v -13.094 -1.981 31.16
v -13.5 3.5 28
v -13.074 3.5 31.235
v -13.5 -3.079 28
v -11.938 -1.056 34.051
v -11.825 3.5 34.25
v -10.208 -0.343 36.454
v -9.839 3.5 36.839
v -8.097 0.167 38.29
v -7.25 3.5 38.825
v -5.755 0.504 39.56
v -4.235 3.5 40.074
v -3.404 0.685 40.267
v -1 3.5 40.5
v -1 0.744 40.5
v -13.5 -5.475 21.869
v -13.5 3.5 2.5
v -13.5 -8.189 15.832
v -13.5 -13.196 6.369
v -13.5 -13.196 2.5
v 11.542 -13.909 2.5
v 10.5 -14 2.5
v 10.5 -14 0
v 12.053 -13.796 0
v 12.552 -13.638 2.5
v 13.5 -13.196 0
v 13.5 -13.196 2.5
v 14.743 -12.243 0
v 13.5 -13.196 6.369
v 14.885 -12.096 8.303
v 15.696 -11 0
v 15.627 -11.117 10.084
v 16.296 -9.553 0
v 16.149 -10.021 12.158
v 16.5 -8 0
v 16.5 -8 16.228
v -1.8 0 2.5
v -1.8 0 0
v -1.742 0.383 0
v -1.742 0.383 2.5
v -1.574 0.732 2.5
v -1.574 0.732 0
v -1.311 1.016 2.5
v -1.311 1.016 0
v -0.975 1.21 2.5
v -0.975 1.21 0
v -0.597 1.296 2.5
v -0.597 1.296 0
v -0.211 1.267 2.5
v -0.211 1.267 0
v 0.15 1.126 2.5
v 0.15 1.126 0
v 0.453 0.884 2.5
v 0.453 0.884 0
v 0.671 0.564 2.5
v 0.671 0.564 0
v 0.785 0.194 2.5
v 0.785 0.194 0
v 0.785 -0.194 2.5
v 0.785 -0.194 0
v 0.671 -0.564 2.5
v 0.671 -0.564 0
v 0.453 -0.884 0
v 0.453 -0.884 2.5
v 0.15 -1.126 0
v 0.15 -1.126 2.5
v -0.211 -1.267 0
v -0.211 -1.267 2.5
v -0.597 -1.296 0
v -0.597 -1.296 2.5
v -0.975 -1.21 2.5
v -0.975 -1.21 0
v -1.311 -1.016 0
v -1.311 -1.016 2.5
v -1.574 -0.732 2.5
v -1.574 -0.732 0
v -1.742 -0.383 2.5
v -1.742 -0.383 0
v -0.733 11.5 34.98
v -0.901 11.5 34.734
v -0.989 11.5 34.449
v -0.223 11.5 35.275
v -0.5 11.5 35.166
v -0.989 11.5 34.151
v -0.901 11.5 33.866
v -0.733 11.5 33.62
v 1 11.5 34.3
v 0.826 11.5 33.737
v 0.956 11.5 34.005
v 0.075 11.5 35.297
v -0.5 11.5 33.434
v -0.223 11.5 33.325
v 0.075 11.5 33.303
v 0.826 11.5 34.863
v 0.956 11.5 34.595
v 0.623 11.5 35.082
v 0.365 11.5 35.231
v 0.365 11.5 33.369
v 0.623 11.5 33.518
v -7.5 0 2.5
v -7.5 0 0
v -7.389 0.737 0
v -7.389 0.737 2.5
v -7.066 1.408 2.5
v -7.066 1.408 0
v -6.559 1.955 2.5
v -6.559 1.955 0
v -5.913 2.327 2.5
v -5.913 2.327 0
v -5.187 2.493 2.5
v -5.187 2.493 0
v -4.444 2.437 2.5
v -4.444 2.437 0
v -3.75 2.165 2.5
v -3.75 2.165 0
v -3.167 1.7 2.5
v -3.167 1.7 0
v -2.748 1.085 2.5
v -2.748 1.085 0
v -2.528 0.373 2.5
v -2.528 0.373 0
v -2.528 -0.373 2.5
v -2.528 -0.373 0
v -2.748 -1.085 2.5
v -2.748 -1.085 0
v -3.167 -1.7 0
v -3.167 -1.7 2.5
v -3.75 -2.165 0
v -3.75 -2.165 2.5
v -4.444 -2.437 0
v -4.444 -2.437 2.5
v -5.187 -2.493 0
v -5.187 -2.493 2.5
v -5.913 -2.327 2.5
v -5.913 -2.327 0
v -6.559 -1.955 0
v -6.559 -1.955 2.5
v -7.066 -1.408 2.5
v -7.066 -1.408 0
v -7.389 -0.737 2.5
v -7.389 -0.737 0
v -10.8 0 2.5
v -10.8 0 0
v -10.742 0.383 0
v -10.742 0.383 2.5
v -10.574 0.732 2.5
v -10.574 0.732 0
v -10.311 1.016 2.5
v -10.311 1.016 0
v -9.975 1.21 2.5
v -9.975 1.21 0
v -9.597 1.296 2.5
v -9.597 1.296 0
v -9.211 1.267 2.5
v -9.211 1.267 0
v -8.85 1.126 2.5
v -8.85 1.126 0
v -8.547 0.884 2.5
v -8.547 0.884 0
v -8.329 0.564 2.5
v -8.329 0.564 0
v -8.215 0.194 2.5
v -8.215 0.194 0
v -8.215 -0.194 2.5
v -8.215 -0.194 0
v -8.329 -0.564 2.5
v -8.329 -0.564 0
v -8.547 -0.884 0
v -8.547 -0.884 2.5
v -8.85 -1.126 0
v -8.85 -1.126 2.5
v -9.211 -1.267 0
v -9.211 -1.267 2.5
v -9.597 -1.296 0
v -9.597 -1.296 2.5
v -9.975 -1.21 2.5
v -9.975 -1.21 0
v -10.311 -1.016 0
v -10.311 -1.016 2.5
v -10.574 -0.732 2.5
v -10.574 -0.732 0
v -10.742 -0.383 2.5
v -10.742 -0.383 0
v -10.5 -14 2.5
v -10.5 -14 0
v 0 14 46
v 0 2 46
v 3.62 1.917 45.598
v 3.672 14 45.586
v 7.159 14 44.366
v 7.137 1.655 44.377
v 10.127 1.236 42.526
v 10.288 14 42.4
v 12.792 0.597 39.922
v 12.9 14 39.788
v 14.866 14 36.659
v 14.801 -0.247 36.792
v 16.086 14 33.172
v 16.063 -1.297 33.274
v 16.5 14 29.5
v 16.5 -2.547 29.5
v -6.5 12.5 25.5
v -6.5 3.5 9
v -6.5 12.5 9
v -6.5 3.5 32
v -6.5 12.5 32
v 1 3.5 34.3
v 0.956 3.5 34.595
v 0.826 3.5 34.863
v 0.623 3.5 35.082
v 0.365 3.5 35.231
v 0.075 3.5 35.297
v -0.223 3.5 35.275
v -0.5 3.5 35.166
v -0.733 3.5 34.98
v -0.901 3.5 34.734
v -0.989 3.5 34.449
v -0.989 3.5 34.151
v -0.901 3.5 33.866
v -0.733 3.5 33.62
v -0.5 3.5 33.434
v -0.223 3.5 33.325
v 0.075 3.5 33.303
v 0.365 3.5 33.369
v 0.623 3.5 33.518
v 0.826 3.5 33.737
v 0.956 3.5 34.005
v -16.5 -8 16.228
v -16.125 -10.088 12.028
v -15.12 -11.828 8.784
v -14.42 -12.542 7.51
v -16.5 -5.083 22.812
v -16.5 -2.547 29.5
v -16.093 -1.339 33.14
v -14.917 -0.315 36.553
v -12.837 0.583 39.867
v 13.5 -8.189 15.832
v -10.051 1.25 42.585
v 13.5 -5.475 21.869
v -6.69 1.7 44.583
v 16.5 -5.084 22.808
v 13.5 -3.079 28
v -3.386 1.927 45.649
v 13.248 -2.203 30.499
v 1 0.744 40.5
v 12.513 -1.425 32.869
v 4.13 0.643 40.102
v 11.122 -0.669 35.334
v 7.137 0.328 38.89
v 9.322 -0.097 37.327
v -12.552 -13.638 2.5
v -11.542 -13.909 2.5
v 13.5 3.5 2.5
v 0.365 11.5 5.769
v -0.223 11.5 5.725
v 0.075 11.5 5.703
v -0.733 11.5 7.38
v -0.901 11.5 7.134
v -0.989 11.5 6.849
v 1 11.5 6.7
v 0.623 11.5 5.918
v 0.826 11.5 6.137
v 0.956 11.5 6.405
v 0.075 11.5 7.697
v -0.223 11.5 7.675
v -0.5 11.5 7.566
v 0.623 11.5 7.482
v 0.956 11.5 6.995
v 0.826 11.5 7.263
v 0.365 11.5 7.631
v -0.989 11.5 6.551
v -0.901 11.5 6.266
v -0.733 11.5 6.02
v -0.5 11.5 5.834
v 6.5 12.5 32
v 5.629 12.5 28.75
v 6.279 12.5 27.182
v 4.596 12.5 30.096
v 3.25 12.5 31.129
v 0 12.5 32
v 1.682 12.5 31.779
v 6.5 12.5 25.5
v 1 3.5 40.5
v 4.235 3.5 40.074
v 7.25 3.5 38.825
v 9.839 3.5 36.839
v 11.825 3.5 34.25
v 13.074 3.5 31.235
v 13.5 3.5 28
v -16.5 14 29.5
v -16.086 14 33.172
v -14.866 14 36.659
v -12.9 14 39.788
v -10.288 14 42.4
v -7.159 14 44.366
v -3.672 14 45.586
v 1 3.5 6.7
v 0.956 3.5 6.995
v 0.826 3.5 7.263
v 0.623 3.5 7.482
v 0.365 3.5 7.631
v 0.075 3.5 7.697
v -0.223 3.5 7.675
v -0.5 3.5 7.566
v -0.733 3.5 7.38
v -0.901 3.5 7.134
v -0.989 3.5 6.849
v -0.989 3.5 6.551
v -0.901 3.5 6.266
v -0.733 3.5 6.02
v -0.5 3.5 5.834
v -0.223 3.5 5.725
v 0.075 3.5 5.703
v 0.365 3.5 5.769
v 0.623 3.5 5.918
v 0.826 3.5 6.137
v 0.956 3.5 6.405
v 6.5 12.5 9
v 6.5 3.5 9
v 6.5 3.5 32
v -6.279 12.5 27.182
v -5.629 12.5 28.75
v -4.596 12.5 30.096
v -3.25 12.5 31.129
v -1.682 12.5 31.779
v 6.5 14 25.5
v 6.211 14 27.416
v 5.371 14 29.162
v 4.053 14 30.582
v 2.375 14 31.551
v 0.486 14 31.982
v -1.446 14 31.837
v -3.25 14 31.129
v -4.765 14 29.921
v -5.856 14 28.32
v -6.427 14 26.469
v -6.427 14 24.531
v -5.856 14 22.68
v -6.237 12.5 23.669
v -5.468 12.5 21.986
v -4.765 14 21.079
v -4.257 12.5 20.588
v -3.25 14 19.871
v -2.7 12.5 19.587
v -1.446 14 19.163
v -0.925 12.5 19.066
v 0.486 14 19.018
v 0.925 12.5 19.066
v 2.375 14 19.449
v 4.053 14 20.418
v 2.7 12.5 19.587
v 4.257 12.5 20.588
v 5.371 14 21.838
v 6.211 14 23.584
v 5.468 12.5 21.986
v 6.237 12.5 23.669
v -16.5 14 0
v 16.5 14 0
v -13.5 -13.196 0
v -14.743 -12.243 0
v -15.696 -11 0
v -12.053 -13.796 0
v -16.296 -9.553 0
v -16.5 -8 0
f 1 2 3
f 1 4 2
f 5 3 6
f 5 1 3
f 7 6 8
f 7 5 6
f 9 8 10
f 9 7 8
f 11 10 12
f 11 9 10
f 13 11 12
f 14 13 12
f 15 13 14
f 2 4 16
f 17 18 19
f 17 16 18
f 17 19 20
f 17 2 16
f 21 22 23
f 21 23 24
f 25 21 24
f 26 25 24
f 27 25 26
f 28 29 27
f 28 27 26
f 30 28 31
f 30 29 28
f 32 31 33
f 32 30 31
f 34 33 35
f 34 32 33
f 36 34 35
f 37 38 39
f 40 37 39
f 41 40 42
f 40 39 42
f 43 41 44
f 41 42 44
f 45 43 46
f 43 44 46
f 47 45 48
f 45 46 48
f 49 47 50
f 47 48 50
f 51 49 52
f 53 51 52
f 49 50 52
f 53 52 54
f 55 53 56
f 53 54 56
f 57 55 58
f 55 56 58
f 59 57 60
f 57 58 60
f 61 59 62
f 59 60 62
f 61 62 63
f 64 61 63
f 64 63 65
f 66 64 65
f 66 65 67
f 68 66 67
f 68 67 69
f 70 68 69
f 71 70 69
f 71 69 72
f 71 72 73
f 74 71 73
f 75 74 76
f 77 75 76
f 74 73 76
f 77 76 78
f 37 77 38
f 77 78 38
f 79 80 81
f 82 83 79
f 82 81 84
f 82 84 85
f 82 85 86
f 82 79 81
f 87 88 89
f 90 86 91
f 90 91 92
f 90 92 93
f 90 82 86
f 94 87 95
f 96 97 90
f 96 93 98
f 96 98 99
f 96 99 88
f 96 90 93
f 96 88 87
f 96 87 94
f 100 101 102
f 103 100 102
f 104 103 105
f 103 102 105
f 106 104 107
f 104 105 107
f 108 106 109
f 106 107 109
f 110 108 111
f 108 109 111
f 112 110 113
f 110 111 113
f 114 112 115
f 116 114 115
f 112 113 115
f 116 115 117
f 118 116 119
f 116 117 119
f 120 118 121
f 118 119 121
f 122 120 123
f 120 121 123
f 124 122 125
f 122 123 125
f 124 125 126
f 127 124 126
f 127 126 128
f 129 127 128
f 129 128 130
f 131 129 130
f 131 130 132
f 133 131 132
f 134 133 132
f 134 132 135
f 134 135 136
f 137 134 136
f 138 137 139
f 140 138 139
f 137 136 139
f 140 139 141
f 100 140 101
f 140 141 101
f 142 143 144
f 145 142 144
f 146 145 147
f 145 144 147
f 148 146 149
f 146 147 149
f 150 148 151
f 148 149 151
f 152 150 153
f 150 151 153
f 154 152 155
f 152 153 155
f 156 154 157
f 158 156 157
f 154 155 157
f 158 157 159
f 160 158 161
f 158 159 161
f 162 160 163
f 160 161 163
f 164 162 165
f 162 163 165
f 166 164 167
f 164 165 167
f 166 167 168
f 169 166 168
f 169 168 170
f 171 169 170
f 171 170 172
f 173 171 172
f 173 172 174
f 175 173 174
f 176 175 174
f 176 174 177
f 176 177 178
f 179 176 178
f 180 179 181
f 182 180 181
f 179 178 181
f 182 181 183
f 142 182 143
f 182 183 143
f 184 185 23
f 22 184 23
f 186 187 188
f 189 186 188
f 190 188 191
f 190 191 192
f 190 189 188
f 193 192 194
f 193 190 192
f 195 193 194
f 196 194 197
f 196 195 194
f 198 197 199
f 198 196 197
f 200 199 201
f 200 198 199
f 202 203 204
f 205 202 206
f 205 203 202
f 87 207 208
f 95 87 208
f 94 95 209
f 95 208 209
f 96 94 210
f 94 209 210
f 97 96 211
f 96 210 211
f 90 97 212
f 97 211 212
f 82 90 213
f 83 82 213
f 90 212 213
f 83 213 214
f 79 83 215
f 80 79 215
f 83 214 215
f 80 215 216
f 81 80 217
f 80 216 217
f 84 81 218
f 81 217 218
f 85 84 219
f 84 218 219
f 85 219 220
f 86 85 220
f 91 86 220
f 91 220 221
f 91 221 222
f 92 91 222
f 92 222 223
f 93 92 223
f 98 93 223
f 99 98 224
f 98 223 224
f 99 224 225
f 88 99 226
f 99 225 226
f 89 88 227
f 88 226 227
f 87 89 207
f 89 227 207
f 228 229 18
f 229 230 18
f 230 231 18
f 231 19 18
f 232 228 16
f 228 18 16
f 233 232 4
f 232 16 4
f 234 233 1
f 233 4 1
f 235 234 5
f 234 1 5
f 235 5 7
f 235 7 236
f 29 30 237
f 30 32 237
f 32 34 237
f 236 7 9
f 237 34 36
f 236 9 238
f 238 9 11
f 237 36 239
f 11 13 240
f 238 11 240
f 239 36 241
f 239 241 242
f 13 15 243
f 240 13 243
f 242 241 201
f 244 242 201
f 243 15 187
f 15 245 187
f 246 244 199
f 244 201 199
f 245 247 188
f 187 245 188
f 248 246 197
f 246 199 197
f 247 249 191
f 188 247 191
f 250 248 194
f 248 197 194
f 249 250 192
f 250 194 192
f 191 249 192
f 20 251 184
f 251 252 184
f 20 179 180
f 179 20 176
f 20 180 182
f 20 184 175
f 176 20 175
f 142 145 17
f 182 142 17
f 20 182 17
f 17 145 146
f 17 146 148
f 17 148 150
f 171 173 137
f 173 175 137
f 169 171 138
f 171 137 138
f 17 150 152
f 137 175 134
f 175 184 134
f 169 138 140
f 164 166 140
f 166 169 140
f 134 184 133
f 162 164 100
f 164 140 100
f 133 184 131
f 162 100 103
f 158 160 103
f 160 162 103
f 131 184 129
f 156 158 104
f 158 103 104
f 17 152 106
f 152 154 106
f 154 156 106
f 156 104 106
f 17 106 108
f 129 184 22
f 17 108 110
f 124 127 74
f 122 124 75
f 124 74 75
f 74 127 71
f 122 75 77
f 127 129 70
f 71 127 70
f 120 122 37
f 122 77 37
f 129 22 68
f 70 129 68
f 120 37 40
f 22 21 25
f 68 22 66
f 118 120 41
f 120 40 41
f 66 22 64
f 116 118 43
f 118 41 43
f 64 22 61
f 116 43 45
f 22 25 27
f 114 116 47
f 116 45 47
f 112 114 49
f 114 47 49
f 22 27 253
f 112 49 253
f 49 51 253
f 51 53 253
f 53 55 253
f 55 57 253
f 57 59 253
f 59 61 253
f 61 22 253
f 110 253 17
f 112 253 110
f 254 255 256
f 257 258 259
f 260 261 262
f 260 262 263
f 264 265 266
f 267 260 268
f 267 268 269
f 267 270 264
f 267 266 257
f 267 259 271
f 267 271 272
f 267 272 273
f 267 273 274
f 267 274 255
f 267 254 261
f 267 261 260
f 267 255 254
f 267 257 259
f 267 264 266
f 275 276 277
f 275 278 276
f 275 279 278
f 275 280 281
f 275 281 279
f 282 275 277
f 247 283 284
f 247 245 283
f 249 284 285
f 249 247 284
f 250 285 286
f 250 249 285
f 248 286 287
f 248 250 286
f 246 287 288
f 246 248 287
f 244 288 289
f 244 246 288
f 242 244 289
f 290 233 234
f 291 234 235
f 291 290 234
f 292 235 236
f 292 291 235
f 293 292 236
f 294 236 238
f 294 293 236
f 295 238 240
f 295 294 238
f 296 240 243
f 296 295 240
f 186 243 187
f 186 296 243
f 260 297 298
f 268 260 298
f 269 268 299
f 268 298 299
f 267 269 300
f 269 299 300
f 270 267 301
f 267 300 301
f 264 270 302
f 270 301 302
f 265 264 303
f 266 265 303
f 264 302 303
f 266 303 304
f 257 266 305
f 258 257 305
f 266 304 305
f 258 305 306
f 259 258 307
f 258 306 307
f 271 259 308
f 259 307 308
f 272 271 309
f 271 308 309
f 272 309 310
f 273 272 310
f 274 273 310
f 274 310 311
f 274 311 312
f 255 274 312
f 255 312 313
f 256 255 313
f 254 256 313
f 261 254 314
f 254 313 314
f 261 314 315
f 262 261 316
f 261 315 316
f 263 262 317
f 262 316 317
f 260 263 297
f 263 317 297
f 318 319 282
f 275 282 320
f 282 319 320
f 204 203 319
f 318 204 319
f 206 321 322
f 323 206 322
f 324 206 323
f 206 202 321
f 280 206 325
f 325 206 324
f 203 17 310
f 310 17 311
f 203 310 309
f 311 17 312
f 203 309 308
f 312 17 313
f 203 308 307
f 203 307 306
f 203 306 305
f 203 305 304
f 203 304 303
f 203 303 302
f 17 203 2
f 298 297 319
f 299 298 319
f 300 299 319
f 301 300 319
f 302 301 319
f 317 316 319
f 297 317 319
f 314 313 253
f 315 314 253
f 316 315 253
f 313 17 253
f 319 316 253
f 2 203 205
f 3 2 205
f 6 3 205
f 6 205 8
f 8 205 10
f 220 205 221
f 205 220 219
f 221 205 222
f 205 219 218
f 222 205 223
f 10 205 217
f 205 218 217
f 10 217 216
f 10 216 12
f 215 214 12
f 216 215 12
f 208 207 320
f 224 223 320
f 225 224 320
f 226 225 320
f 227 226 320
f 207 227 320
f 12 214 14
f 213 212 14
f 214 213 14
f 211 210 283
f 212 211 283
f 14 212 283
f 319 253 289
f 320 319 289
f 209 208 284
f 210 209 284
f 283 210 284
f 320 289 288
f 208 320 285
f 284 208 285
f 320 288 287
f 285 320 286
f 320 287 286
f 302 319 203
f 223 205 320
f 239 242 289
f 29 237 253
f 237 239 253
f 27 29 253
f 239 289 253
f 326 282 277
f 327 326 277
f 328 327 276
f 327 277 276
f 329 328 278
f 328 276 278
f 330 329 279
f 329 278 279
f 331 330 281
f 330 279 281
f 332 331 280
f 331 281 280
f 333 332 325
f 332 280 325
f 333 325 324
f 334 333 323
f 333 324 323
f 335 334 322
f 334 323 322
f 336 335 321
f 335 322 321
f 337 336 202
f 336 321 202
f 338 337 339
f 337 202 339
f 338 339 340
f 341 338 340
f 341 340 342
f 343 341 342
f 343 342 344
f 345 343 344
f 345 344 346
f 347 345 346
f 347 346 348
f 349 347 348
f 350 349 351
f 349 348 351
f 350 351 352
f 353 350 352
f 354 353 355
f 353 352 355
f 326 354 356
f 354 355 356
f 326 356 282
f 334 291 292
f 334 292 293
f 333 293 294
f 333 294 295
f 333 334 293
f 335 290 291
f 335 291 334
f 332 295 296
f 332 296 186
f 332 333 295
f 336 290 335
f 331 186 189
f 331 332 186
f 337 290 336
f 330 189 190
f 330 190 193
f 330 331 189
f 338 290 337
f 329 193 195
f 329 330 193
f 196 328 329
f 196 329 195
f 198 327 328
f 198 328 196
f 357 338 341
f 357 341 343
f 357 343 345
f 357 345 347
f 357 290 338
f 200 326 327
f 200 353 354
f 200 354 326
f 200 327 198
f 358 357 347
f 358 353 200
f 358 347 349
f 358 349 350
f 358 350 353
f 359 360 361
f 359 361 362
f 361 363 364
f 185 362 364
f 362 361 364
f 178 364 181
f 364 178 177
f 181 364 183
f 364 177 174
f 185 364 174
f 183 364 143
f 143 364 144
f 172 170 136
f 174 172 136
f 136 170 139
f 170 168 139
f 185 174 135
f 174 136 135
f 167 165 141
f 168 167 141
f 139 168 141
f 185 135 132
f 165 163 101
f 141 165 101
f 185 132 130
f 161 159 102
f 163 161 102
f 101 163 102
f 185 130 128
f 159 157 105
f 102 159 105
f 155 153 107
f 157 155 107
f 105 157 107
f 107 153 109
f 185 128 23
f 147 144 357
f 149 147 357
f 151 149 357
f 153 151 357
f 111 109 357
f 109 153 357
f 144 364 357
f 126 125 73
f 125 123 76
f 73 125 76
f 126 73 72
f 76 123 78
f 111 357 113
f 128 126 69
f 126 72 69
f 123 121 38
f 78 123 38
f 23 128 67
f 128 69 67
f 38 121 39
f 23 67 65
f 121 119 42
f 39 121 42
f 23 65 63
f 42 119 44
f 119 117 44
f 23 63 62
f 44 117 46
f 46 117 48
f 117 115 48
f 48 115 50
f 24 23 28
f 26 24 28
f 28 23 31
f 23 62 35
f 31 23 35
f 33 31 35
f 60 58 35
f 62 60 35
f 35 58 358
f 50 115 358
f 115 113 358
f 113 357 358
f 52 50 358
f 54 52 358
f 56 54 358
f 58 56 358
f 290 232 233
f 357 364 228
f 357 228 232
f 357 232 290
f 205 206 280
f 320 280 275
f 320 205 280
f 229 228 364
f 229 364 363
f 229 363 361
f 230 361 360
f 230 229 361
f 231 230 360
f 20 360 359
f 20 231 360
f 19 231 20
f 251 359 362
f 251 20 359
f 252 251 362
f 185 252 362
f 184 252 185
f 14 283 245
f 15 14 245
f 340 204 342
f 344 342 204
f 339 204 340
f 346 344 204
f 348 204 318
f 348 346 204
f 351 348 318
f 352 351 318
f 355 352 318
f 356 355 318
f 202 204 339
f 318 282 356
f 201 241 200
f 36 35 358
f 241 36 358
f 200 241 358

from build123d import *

# Parameters (mm, degrees)
SKETCH1_W           = 33
SKETCH1_H           = 28
BOSS_EXTRUDE1_DEPTH = 46
CUT_EXTRUDE1_DEPTH  = 59.318093247
CUT_EXTRUDE2_START  = -3
CUT_EXTRUDE2_DEPTH  = 27
FILLET1_R           = 12.5
FILLET2_R           = 16.5
FILLET3_R           = 6
SKETCH4_W           = 13
SKETCH4_H           = 23
CUT_EXTRUDE3_DEPTH  = 9
SKETCH5_R           = 6.5
CUT_EXTRUDE4_DEPTH  = 56.592265809
SKETCH6_R           = 1
CUT_EXTRUDE5_DEPTH  = 8
SKETCH7_R           = 1.3
SKETCH7_R_2         = 2.5
CUT_EXTRUDE6_DEPTH  = 2.5


with BuildPart() as part:
    # Sketch1 → Boss-Extrude1 (new body)
    with BuildSketch(Plane.XY):
        Rectangle(SKETCH1_W, SKETCH1_H)
    extrude(amount=BOSS_EXTRUDE1_DEPTH)

    # Sketch2 → Cut-Extrude1 (cut, through all)
    with BuildSketch(Plane(origin=(16.5, 0, 0), x_dir=(0, 0, -1), z_dir=(1, 0, 0))):
        with BuildLine():
            Line((-46, 2), (-46, -14))
            Line((-46, -14), (-5, -14))
            add(Edge.make_bspline(
                [(-5, -14), (-24.445807758, -2.434726237), (-46, 2)],
                knots=[0, 0, 0, 1, 1, 1], degree=2))
        make_face()
    extrude(amount=-CUT_EXTRUDE1_DEPTH, mode=Mode.SUBTRACT)

    # Sketch3 → Cut-Extrude2 (cut)
    with BuildSketch(Plane(origin=(16.5, 0, 0), x_dir=(0, 0, -1), z_dir=(1, 0, 0)).offset(CUT_EXTRUDE2_START)):
        with BuildLine():
            Line((-5, -14), (-2.5, -14))
            Line((-2.5, -14), (-2.5, 3.5))
            Line((-2.5, 3.5), (-40.5, 3.5))
            Line((-40.5, 3.5), (-40.5, 0.743693735))
            add(Edge.make_bspline(
                [(-5, -14), (-21.949128929, -3.919610512), (-40.5, 0.743693735)],
                knots=[0, 0, 0, 1, 1, 1], degree=2))
        make_face()
    extrude(amount=-CUT_EXTRUDE2_DEPTH, mode=Mode.SUBTRACT)

    # Fillet1
    fillet1_edges = [part.edges().sort_by_distance(p)[0] for p in [
        (13.5, 2.121846868, 40.5),
        (-13.5, 2.121846868, 40.5),
    ]]
    fillet(fillet1_edges, radius=FILLET1_R)

    # Fillet2
    fillet2_edges = [part.edges().sort_by_distance(p)[0] for p in [
        (16.5, 8, 46),
        (-16.5, 8, 46),
    ]]
    fillet(fillet2_edges, radius=FILLET2_R - 0.0001)  # a hair under: the kernel refuses the full size

    # Fillet3
    fillet3_edges = [part.edges().sort_by_distance(p)[0] for p in [
        (-16.5, -14, 2.5),
        (16.5, -14, 2.5),
    ]]
    fillet(fillet3_edges, radius=FILLET3_R)

    # Sketch4 → Cut-Extrude3 (cut)
    with BuildSketch(Plane.XZ.offset(-3.5)):
        with Locations((0, 20.5)):
            Rectangle(SKETCH4_W, SKETCH4_H)
    extrude(amount=-CUT_EXTRUDE3_DEPTH, mode=Mode.SUBTRACT)

    # Sketch5 → Cut-Extrude4 (cut, through all)
    with BuildSketch(Plane.XZ.offset(-12.5)):
        with Locations((0, 25.5)):
            Circle(SKETCH5_R)
    extrude(amount=-CUT_EXTRUDE4_DEPTH, mode=Mode.SUBTRACT)

    # Sketch6 → Cut-Extrude5 (cut)
    with BuildSketch(Plane.XZ.offset(-3.5)):
        with Locations((0, 34.3)):
            Circle(SKETCH6_R)
        with Locations((0, 6.7)):
            Circle(SKETCH6_R)
    extrude(amount=-CUT_EXTRUDE5_DEPTH, mode=Mode.SUBTRACT)

    # Sketch7 → Cut-Extrude6 (cut)
    with BuildSketch(Plane(origin=(0, 0, 0), x_dir=(-1, 0, 0), z_dir=(0, 0, -1))):
        with Locations((0.5, 0)):
            Circle(SKETCH7_R)
        with Locations((5, 0)):
            Circle(SKETCH7_R_2)
        with Locations((9.5, 0)):
            Circle(SKETCH7_R)
    extrude(amount=-CUT_EXTRUDE6_DEPTH, mode=Mode.SUBTRACT)


solid = part.part
